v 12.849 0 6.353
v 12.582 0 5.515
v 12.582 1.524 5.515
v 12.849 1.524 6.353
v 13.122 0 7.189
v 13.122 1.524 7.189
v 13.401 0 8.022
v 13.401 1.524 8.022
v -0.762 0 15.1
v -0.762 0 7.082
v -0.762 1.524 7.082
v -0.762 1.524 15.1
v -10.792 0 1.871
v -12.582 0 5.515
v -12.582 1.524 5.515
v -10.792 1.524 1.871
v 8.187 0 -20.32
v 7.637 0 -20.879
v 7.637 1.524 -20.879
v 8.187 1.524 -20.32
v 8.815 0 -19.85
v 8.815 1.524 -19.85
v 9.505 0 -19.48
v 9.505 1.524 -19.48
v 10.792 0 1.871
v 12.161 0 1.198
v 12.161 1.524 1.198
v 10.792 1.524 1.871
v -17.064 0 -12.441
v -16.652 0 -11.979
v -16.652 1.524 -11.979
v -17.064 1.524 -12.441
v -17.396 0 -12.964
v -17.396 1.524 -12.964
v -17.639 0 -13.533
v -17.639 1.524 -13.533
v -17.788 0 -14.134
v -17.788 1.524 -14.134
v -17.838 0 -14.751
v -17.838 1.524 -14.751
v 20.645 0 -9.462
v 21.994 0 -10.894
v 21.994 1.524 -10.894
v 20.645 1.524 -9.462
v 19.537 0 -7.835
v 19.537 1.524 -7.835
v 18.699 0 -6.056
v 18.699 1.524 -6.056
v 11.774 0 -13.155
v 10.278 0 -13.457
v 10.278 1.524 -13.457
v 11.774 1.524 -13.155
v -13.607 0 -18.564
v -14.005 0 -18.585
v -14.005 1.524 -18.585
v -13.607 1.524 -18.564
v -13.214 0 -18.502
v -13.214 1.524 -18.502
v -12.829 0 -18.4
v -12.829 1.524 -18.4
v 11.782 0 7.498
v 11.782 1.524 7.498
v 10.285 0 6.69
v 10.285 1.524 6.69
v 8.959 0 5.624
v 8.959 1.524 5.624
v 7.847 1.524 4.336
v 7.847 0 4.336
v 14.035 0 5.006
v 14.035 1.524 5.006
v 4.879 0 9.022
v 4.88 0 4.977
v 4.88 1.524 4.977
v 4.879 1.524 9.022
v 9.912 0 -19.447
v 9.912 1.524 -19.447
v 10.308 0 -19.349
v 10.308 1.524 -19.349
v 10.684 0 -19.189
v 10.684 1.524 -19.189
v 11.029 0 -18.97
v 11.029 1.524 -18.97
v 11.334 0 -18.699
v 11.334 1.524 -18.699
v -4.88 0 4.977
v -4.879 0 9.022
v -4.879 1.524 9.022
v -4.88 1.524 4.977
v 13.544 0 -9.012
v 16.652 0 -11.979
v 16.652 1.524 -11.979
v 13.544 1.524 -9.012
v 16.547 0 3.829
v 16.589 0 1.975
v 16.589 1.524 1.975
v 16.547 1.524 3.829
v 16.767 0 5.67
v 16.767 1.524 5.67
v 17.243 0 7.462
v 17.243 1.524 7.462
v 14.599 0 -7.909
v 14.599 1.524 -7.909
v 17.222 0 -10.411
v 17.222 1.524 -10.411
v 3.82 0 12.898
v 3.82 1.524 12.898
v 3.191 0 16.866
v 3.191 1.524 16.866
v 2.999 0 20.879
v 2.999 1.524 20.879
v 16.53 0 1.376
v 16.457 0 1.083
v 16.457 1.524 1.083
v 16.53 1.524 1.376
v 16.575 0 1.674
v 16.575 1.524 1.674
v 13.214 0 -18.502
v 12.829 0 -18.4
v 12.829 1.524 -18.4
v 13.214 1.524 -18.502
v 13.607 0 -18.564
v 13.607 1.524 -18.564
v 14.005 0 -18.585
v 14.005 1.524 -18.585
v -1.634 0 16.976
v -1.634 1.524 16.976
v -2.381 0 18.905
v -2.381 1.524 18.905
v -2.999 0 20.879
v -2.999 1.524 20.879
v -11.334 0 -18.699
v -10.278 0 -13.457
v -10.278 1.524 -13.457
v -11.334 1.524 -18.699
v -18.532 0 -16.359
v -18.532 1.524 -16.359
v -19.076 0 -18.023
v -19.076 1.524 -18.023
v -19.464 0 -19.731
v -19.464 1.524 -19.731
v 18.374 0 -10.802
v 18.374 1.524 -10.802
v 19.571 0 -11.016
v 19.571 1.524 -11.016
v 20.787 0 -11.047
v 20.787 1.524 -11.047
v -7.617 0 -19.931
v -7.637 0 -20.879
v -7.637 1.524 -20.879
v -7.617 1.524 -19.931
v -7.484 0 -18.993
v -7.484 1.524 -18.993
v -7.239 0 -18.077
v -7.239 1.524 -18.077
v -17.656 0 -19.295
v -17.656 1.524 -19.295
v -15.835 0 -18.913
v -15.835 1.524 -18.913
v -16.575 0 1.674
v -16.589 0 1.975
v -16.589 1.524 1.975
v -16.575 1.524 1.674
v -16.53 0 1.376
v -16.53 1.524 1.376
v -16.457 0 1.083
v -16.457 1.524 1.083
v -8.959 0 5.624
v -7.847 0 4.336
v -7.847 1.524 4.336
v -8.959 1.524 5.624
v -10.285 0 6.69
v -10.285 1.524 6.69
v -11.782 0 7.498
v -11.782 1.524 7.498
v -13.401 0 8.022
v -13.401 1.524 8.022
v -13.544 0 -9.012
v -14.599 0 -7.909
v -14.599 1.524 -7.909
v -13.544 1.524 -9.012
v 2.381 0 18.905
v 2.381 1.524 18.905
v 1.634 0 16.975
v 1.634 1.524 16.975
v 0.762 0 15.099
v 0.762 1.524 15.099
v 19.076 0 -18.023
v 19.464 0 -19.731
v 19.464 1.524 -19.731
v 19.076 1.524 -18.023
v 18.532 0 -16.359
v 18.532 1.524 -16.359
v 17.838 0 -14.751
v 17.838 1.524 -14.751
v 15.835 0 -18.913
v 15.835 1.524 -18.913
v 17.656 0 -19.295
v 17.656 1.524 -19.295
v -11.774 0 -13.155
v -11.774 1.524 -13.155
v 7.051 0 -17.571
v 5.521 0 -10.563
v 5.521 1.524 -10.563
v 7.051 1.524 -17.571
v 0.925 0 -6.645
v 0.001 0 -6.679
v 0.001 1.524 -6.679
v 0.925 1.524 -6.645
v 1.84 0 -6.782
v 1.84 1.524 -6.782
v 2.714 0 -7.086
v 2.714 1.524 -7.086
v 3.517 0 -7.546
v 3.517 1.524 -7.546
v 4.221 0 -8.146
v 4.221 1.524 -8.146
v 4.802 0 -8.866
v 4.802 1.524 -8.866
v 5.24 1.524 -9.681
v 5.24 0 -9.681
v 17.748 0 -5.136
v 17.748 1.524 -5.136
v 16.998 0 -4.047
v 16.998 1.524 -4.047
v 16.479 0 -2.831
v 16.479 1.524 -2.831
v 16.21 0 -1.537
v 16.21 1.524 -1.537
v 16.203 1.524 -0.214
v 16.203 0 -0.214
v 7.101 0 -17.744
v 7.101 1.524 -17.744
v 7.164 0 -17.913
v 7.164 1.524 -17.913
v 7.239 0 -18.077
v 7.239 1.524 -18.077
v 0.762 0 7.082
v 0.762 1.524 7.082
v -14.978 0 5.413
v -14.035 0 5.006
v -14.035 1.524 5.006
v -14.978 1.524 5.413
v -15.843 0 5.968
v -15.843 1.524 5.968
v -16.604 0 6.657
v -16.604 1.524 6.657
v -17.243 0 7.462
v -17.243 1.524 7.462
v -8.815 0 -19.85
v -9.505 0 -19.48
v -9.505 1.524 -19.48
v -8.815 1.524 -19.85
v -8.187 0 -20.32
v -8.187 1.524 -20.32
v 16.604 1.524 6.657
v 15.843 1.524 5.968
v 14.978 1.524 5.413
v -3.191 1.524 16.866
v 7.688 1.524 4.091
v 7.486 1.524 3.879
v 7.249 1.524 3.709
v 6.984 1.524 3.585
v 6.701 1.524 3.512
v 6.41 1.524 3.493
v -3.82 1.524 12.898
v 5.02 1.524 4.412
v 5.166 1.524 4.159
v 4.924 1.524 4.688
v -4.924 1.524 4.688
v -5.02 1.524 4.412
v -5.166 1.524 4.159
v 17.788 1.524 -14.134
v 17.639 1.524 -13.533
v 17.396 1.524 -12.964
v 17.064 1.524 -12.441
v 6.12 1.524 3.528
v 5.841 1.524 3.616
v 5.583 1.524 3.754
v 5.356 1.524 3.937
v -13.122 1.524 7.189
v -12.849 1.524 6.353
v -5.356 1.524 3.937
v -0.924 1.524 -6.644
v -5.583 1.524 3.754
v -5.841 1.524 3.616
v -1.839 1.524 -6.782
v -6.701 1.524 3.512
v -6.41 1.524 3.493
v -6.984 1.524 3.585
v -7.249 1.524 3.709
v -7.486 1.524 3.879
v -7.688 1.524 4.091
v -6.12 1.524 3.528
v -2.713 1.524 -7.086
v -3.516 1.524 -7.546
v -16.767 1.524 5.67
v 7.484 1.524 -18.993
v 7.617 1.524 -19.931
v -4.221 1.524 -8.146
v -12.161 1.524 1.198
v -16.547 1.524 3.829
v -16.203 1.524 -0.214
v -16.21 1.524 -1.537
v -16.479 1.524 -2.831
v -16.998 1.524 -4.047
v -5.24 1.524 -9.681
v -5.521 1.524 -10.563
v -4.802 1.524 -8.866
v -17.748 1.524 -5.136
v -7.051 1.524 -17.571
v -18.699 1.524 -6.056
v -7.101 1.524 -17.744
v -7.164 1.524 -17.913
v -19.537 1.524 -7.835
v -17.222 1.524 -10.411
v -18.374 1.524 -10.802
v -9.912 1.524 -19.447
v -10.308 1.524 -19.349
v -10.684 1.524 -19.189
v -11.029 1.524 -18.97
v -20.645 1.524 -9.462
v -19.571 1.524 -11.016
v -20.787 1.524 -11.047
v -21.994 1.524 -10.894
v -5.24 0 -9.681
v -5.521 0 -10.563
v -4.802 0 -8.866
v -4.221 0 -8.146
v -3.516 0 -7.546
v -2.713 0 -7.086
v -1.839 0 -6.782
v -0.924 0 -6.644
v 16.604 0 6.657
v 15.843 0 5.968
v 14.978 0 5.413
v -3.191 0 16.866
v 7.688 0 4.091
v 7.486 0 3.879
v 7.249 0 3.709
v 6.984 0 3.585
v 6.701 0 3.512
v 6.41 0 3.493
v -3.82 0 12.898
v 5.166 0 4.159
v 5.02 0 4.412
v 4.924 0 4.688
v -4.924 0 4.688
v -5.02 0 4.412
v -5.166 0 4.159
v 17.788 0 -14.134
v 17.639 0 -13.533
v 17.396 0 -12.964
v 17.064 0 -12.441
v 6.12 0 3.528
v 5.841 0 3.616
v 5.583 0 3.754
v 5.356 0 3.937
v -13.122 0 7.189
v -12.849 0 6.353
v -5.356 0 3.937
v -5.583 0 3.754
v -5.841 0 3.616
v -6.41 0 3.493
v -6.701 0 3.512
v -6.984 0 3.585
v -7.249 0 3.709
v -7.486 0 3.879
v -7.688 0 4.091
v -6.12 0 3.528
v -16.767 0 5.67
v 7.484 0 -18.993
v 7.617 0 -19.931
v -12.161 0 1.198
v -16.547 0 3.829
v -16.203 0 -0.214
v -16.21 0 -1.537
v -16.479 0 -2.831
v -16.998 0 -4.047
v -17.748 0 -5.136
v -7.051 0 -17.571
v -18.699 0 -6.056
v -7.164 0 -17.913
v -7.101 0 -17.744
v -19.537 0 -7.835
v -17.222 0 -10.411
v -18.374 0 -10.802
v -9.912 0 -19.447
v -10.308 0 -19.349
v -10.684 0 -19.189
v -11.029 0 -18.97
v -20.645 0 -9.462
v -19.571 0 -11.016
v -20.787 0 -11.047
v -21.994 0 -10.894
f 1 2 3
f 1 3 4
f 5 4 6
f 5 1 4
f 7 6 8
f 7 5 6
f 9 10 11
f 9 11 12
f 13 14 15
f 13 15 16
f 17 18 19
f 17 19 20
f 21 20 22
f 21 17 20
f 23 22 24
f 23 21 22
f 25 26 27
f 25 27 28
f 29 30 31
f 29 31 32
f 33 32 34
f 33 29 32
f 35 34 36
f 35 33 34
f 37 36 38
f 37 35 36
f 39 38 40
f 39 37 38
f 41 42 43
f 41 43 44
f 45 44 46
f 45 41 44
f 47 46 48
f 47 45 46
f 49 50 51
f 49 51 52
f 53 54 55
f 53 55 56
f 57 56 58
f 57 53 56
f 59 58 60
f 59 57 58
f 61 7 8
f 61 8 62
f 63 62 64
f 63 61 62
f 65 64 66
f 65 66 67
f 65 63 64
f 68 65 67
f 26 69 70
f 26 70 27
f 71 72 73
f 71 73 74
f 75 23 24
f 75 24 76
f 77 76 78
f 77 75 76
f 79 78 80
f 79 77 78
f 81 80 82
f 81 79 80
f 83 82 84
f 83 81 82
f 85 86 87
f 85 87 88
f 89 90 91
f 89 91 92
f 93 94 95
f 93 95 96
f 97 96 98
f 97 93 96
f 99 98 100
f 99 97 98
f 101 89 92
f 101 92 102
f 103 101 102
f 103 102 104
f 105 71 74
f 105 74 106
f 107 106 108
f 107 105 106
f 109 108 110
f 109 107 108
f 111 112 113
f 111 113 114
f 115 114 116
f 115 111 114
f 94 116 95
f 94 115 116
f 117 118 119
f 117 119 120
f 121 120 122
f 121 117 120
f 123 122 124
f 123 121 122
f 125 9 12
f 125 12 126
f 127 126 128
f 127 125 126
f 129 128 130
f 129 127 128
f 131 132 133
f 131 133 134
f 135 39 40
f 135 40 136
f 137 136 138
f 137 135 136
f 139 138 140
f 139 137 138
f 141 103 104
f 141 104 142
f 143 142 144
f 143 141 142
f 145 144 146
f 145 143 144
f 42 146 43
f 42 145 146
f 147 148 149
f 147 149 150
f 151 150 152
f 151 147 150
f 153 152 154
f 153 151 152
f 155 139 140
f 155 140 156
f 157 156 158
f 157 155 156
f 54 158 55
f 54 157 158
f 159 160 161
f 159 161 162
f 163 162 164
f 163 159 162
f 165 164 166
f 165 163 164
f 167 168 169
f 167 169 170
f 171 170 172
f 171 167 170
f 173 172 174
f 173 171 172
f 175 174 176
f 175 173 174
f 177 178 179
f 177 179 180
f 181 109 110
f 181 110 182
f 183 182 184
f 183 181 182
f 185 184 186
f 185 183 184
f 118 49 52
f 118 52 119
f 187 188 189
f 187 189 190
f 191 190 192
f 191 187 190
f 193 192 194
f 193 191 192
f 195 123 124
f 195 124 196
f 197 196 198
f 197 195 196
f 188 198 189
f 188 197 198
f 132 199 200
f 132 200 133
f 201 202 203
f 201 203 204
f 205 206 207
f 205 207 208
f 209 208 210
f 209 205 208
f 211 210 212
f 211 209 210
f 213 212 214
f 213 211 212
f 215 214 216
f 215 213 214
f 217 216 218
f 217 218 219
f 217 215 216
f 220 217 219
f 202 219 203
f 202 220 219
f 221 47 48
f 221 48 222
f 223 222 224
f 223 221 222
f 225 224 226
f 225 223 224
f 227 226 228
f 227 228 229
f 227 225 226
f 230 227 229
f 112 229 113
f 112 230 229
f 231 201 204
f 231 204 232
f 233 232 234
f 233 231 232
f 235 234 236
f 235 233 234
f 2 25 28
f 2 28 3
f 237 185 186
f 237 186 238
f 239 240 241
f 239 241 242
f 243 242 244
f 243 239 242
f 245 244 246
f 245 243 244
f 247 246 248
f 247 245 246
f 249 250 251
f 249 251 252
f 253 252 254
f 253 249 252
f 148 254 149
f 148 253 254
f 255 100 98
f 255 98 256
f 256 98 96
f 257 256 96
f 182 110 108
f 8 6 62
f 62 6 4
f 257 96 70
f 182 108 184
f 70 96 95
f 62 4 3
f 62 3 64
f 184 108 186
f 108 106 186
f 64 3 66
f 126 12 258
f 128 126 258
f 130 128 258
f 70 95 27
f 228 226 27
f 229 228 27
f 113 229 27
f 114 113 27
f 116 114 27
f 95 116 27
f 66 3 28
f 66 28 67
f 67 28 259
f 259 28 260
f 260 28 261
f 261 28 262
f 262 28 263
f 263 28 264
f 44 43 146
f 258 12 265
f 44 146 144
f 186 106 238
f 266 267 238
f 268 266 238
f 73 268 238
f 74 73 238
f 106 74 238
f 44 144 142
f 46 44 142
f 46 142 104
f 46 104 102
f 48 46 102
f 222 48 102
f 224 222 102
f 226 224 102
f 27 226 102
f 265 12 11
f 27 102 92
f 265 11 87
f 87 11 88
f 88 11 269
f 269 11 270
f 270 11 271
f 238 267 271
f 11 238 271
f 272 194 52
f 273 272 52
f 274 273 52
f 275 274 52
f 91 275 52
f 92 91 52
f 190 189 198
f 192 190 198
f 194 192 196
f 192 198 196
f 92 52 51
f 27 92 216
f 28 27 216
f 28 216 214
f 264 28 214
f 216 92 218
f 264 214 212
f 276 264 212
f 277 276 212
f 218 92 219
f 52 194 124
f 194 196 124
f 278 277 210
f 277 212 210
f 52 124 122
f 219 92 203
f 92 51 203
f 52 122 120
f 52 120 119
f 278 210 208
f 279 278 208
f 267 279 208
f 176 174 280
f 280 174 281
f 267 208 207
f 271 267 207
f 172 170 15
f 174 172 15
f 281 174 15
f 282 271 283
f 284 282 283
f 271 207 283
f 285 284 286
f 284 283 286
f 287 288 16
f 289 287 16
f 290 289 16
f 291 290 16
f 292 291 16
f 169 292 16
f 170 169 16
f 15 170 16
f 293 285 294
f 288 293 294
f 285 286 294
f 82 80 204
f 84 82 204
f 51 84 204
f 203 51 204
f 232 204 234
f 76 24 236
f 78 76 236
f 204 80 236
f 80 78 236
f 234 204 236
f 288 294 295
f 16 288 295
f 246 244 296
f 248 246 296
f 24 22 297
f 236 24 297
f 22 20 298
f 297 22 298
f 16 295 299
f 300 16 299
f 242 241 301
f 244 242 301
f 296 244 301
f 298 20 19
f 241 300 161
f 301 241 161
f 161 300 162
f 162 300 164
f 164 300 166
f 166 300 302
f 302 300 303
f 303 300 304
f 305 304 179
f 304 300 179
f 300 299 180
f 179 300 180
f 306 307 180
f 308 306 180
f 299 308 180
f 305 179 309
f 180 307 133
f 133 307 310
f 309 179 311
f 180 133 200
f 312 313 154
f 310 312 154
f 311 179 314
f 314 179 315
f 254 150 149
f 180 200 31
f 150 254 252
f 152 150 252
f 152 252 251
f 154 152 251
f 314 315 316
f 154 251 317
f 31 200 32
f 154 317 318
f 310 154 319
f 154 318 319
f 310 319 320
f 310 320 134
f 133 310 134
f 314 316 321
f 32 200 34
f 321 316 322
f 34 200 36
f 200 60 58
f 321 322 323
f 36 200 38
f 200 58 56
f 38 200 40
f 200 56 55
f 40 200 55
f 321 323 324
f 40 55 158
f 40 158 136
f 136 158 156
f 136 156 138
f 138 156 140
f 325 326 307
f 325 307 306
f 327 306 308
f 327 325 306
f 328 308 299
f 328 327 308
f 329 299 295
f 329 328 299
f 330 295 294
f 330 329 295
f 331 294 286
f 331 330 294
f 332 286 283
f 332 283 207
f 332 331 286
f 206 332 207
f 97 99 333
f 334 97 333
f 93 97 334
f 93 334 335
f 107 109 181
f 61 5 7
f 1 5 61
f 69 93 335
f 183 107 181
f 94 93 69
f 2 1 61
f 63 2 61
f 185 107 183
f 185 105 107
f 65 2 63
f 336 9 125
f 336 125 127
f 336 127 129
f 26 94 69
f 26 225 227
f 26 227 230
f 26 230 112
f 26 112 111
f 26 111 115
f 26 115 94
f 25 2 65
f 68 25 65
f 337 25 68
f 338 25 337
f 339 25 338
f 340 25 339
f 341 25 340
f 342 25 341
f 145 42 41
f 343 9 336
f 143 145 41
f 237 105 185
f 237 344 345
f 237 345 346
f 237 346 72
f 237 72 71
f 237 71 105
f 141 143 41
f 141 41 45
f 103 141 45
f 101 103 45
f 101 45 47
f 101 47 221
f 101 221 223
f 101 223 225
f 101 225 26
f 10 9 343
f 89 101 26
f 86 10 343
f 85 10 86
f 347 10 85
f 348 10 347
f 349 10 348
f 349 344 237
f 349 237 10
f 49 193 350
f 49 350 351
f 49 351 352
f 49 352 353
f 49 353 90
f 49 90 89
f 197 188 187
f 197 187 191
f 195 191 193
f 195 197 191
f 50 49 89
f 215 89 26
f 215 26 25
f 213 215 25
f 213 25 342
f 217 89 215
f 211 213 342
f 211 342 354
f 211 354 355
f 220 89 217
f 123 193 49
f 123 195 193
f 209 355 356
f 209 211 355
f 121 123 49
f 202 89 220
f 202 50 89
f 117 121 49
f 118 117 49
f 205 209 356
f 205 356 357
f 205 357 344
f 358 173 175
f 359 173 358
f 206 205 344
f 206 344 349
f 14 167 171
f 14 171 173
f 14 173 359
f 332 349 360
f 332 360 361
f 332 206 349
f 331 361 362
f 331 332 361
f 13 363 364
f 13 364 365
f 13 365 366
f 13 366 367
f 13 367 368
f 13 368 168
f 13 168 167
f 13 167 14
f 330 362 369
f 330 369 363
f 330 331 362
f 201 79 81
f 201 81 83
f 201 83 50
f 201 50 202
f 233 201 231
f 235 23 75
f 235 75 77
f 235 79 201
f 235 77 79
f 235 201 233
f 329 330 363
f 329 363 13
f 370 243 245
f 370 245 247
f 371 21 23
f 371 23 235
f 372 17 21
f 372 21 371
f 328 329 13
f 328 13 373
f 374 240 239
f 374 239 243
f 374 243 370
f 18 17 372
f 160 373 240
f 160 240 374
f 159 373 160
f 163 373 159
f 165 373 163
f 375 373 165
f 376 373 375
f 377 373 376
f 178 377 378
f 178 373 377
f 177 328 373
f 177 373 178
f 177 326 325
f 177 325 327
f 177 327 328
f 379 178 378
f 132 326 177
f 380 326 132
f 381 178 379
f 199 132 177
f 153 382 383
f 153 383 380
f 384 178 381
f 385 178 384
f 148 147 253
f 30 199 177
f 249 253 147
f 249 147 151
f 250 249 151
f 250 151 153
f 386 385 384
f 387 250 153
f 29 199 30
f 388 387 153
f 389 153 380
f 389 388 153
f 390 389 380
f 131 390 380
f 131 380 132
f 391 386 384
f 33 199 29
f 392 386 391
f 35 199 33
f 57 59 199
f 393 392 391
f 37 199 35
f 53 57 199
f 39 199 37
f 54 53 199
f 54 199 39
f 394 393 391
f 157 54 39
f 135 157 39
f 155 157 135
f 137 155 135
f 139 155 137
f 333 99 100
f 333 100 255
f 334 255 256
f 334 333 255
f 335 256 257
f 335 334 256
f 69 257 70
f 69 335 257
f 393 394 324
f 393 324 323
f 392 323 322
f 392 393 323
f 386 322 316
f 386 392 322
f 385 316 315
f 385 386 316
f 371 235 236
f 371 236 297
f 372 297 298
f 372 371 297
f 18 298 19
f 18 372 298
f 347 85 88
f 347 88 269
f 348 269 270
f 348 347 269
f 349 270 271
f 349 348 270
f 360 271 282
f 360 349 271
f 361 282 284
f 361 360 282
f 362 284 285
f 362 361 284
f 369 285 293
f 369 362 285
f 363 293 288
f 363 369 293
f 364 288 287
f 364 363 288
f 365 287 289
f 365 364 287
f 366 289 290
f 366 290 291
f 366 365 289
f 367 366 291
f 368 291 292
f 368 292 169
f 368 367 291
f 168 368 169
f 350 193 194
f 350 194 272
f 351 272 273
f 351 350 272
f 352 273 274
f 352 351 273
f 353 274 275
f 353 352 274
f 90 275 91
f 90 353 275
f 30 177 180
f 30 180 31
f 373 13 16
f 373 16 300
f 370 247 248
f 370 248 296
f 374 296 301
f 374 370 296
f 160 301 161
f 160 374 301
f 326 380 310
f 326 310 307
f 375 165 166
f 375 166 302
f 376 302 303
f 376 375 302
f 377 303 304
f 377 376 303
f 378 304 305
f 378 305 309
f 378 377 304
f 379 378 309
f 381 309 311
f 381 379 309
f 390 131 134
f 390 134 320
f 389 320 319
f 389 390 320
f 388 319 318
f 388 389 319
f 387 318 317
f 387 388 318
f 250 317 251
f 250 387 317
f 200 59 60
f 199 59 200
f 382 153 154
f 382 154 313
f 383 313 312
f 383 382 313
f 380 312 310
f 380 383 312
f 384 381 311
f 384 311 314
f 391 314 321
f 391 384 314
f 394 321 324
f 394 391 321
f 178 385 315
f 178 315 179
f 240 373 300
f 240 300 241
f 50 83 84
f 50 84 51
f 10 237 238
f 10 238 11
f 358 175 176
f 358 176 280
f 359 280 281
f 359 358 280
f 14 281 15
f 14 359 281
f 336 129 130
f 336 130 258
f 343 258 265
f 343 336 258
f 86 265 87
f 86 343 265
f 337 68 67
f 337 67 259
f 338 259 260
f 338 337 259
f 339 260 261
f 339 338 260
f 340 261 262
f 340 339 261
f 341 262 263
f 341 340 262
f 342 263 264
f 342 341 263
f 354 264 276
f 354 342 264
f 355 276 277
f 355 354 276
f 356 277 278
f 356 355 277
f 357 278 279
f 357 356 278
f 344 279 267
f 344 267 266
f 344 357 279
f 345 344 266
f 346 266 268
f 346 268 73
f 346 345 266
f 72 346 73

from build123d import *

# Parameters (mm, degrees)
BOSS_EXTRUDE1_DEPTH = 1.524


with BuildPart() as part:
    # Sketch1 → Boss-Extrude1 (new body)
    with BuildSketch(Plane(origin=(0, 0, 0), x_dir=(1, 0, 0), z_dir=(0, 1, 0))):
        with BuildLine():
            Line((5.520593562, 10.562997869), (7.050708645, 17.571208446))
            ThreePointArc((7.050708645, 17.571208446), (7.131145016, 17.829150642), (7.238606677, 18.077054207))
            ThreePointArc((7.238606677, 18.077054207), (7.564510049, 19.45989002), (7.637457251, 20.878736946))
            ThreePointArc((7.637457251, 20.878736946), (8.492098945, 20.073618252), (9.504942938, 19.47966911))
            ThreePointArc((9.504942938, 19.47966911), (10.499295157, 19.276273595), (11.333912028, 18.698761041))
            Line((11.333912028, 18.698761041), (10.277523058, 13.457219083))
            Line((10.277523058, 13.457219083), (11.773700319, 13.155201971))
            Line((11.773700319, 13.155201971), (12.828772876, 18.399768932))
            ThreePointArc((12.828772876, 18.399768932), (13.409499296, 18.538098505), (14.004660893, 18.584584187))
            ThreePointArc((14.004660893, 18.584584187), (16.746835107, 19.097796263), (19.463914435, 19.730556864))
            ThreePointArc((19.463914435, 19.730556864), (18.823035781, 17.184750652), (17.837865312, 14.751379768))
            ThreePointArc((17.837865312, 14.751379768), (17.528924841, 13.243726046), (16.651902084, 11.979093671))
            Line((16.651902084, 11.979093671), (13.544076564, 9.012401066))
            Line((13.544076564, 9.012401066), (14.59914963, 7.908648182))
            Line((14.59914963, 7.908648182), (17.221929817, 10.411217166))
            ThreePointArc((17.221929817, 10.411217166), (19.571015538, 11.015907736), (21.993615768, 10.893995741))
            ThreePointArc((21.993615768, 10.893995741), (20.058776223, 8.670441452), (18.698609679, 6.055533286))
            ThreePointArc((18.698609679, 6.055533286), (16.478620051, 2.831263642), (16.457225541, -1.083300314))
            ThreePointArc((16.457225541, -1.083300314), (16.55614989, -1.524335384), (16.589363804, -1.975106719))
            ThreePointArc((16.589363804, -1.975106719), (16.624442109, -4.753141238), (17.243254302, -7.461605332))
            ThreePointArc((17.243254302, -7.461605332), (15.84253831, -5.968117791), (14.035036599, -5.006115769))
            Line((14.035036599, -5.006115769), (12.161156101, -1.197565278))
            Line((12.161156101, -1.197565278), (10.792144449, -1.871143044))
            Line((10.792144449, -1.871143044), (12.582390495, -5.515217687))
            ThreePointArc((12.582390495, -5.515217687), (12.984657899, -6.771031753), (13.401445653, -8.022101696))
            ThreePointArc((13.401445653, -8.022101696), (10.284977839, -6.689966631), (7.846889336, -4.335676947))
            ThreePointArc((7.846889336, -4.335676947), (6.119650246, -3.528046665), (4.880261331, -4.977024464))
            Line((4.880261331, -4.977024464), (4.878620901, -9.02232865))
            ThreePointArc((4.878620901, -9.02232865), (3.451641907, -14.873313942), (2.99866015, -20.878736946))
            ThreePointArc((2.99866015, -20.878736946), (2.023183201, -17.933730156), (0.761997186, -15.099293685))
            Line((0.761997186, -15.099293685), (0.761997186, -7.081931903))
            Line((0.761997186, -7.081931903), (-0.761997186, -7.081931903))
            Line((-0.761997186, -7.081931903), (-0.761997186, -15.100287099))
            ThreePointArc((-0.761997186, -15.100287099), (-2.023137189, -17.934235169), (-2.99866015, -20.878736946))
            ThreePointArc((-2.99866015, -20.878736946), (-3.451641907, -14.873313942), (-4.878620901, -9.02232865))
            Line((-4.878620901, -9.02232865), (-4.880261331, -4.977024464))
            ThreePointArc((-4.880261331, -4.977024464), (-6.119650246, -3.528046665), (-7.846889336, -4.335676947))
            ThreePointArc((-7.846889336, -4.335676947), (-10.284977839, -6.689966631), (-13.401445653, -8.022101696))
            ThreePointArc((-13.401445653, -8.022101696), (-12.984657899, -6.771031753), (-12.582390495, -5.515217687))
            Line((-12.582390495, -5.515217687), (-10.792144449, -1.871143044))
            Line((-10.792144449, -1.871143044), (-12.161156101, -1.197565278))
            Line((-12.161156101, -1.197565278), (-14.035036599, -5.006115769))
            ThreePointArc((-14.035036599, -5.006115769), (-15.84253831, -5.968117791), (-17.243254302, -7.461605332))
            ThreePointArc((-17.243254302, -7.461605332), (-16.624442109, -4.753141238), (-16.589363804, -1.975106719))
            ThreePointArc((-16.589363804, -1.975106719), (-16.55614989, -1.524335384), (-16.457225541, -1.083300314))
            ThreePointArc((-16.457225541, -1.083300314), (-16.478620051, 2.831263642), (-18.698609679, 6.055533286))
            ThreePointArc((-18.698609679, 6.055533286), (-20.058776223, 8.670441452), (-21.993615768, 10.893995741))
            ThreePointArc((-21.993615768, 10.893995741), (-19.571015538, 11.015907736), (-17.221929817, 10.411217166))
            Line((-17.221929817, 10.411217166), (-14.59914963, 7.908648182))
            Line((-14.59914963, 7.908648182), (-13.544076564, 9.012401066))
            Line((-13.544076564, 9.012401066), (-16.651902084, 11.979093671))
            ThreePointArc((-16.651902084, 11.979093671), (-17.528924841, 13.243726046), (-17.837865312, 14.751379768))
            ThreePointArc((-17.837865312, 14.751379768), (-18.823035781, 17.184750652), (-19.463914435, 19.730556864))
            ThreePointArc((-19.463914435, 19.730556864), (-16.746835107, 19.097796263), (-14.004660893, 18.584584187))
            ThreePointArc((-14.004660893, 18.584584187), (-13.409499296, 18.538098505), (-12.828772876, 18.399768932))
            Line((-12.828772876, 18.399768932), (-11.773700319, 13.155201971))
            Line((-11.773700319, 13.155201971), (-10.277523058, 13.457219083))
            Line((-10.277523058, 13.457219083), (-11.333912028, 18.698761041))
            ThreePointArc((-11.333912028, 18.698761041), (-10.499295157, 19.276273595), (-9.504942938, 19.47966911))
            ThreePointArc((-9.504942938, 19.47966911), (-8.492098945, 20.073618252), (-7.637457251, 20.878736946))
            ThreePointArc((-7.637457251, 20.878736946), (-7.564510049, 19.45989002), (-7.238606677, 18.077054207))
            ThreePointArc((-7.238606677, 18.077054207), (-7.131145016, 17.829150642), (-7.050708645, 17.571208446))
            Line((-7.050708645, 17.571208446), (-5.520593562, 10.562997869))
            ThreePointArc((-5.520593562, 10.562997869), (-3.516439493, 7.545594261), (0.000595641, 6.678517605))
            ThreePointArc((0.000595641, 6.678517605), (3.516886937, 7.546036839), (5.520593562, 10.562997869))
        make_face()
    extrude(amount=BOSS_EXTRUDE1_DEPTH)


solid = part.part
